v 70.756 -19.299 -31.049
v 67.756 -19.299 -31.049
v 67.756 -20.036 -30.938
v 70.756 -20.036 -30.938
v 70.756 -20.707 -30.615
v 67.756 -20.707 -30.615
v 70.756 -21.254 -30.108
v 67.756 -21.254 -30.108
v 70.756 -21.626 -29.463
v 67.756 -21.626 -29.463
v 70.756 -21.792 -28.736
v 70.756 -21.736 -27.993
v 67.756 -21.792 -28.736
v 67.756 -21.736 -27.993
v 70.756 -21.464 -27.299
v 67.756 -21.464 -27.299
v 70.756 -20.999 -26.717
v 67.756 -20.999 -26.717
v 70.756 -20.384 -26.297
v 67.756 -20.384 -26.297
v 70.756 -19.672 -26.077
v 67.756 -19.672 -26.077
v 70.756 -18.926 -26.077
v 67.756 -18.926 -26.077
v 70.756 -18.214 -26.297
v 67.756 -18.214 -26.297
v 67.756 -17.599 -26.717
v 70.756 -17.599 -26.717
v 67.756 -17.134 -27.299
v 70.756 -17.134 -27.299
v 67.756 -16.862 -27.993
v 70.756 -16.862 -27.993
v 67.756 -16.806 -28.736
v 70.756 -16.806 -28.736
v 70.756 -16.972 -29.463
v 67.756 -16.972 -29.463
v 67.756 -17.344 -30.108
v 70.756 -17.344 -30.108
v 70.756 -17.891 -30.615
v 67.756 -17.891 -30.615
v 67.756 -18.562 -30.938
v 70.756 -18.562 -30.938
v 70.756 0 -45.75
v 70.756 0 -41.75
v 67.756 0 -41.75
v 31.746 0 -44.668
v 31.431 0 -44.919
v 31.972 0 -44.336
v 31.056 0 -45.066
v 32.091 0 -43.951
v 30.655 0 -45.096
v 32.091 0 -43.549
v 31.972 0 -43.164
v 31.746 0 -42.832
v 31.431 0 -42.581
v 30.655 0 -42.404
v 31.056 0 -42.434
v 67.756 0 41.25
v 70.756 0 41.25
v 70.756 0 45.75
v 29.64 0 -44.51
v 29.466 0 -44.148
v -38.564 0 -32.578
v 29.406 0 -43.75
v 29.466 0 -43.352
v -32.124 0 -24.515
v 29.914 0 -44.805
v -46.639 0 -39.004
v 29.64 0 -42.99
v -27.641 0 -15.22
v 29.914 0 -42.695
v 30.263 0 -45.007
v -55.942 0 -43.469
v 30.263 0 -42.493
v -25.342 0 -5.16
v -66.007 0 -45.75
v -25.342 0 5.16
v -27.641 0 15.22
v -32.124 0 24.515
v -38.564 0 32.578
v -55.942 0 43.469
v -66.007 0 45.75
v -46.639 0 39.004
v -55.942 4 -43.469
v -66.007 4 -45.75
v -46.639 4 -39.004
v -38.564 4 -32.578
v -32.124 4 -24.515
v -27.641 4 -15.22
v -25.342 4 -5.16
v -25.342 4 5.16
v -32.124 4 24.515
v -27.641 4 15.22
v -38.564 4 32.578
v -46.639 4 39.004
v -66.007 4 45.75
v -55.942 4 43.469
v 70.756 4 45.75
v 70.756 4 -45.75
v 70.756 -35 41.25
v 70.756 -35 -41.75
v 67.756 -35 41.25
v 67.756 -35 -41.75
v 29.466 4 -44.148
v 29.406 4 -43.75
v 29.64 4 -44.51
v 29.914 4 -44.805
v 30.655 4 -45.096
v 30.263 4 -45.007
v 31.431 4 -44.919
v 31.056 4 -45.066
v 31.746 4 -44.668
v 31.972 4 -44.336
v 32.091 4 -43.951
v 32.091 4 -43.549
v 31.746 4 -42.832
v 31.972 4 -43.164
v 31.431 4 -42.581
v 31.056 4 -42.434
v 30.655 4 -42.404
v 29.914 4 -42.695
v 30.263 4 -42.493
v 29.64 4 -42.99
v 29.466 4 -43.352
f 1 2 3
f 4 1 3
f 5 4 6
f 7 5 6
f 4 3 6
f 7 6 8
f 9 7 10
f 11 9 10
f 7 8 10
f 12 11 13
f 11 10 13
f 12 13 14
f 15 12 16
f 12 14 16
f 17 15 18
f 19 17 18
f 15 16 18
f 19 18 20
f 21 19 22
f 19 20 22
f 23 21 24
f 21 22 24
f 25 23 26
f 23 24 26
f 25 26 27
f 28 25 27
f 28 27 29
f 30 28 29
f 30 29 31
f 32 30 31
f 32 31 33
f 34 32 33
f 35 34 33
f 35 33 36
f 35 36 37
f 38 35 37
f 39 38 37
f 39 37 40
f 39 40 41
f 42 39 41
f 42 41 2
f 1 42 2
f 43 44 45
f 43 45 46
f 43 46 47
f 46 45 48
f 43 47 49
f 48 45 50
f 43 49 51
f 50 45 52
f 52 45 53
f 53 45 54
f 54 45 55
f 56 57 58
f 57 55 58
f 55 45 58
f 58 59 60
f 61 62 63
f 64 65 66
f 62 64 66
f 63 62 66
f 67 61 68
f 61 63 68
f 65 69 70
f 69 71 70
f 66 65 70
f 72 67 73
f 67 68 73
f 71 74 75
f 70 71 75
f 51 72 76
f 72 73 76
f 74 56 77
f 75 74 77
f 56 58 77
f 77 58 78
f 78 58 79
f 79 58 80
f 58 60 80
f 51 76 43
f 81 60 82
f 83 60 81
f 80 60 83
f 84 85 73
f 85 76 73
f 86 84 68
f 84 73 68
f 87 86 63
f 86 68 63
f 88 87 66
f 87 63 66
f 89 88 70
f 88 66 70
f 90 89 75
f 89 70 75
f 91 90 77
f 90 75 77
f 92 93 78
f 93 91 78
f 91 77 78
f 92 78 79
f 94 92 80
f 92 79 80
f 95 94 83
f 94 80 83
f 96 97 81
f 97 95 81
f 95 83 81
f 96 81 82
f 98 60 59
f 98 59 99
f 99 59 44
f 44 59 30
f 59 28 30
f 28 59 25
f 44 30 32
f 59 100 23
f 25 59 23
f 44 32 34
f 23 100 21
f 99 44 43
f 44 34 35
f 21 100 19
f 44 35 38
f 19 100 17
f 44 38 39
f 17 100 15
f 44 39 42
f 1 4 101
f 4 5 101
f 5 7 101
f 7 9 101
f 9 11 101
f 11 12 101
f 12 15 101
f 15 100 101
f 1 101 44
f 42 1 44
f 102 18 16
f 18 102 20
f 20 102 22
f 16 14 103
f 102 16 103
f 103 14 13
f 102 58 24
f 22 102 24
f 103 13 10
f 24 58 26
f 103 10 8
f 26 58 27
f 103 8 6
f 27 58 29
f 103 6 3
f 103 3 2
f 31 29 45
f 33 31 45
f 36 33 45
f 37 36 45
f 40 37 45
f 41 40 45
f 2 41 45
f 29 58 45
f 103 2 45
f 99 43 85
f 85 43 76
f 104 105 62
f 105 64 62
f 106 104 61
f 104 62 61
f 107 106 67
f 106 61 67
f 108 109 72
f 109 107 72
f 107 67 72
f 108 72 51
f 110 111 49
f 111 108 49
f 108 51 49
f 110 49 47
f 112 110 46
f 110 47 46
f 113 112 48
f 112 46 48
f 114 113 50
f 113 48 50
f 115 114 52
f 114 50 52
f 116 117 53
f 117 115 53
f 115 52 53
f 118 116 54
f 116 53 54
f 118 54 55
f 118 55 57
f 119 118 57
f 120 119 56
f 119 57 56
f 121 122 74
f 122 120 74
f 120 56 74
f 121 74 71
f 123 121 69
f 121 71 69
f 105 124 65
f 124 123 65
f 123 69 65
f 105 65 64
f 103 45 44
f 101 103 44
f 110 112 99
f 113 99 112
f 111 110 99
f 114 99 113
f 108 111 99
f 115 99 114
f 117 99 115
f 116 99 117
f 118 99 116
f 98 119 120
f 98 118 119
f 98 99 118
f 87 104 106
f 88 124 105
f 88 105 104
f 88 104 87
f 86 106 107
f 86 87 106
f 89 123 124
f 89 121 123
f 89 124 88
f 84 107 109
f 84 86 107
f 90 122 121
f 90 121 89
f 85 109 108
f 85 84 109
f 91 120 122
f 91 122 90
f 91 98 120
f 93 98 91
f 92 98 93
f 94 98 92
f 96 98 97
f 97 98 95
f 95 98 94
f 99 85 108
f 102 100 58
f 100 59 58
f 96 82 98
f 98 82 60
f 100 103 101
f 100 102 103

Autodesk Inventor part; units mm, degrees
ref_plane "YZ Plane" through (0, 0, 0) normal (1, 0, 0) x (0, 1, 0)
ref_plane "XZ Plane" through (0, 0, 0) normal (0, 1, 0) x (-1, 0, 0)
ref_plane "XY Plane" through (0, 0, 0) normal (0, 0, 1) x (1, 0, 0)
sketch "Esboço1" plane through (0, 0, 0) normal (0, 1, 0) x (-1, 0, 0)
  line L0 (-70.7559, -45.75) -> (70.7559, -45.75)
  line L1 (70.7559, 45.75) -> (-70.7559, 45.75)
  line L2 (-70.7559, 45.75) -> (-70.7559, -45.75)
  line L3 (-70.7559, -45.75) -> (70.7559, 45.75) construction
  line L4 (70.7559, -45.75) -> (-70.7559, 45.75) construction
  arc A0 (66.0067, 45.75) -> (66.0067, -45.75) centre (71.083, 0) ccw
  circle A1 centre (-30.7559, -43.75) radius 1.35
  point P0 (0, 0)
  dimension "d3" = 2.7
  dimension "d4" = 2
  dimension "d5" = 40
  dimension "d15" = 91.5
extrude "Extrusão1" add sketch "Esboço1" along normal blind 4
sketch "Esboço2" plane through (0, 0, 0) normal (0, -1, 0) x (1, 0, 0)
  line L0 (-66.0067, 45.75) -> (70.7559, 45.75) projected
  line L1 (70.7559, -45.75) -> (-66.0067, -45.75) projected
  line L2 (70.7559, 45.75) -> (67.7559, 45.75)
  line L3 (67.7559, 45.75) -> (67.7559, -45.75)
  line L4 (67.7559, -45.75) -> (70.7559, -45.75)
  line L5 (70.7559, -45.75) -> (70.7559, 45.75)
  line L6 (67.7559, -41.75) -> (70.7559, -41.75)
  line L7 (70.7559, -41.75) -> (70.7559, 41.25)
  line L8 (70.7559, 41.25) -> (67.7559, 41.25)
  line L9 (67.7559, 41.25) -> (67.7559, -41.75)
  line L10 (67.7559, -41.75) -> (70.7559, 41.25) construction
  line L11 (70.7559, -41.75) -> (67.7559, 41.25) construction
  point P0 (0, 0)
  point P1 (69.2559, -0.25)
  point P2 (70.7559, 41.25)
  point P3 (67.7559, 41.25)
  point P4 (67.7559, -41.75)
  point P5 (70.7559, -41.75)
  point P6 (69.2559, -41.75)
  point P7 (69.2559, -45.75)
  point P8 (69.2559, 45.75)
  point P9 (69.2559, 41.25)
  dimension "d8" = 3
  dimension "d9" = 3
  dimension "d10" = 83
  dimension "d14" = 4.5
extrude "Extrusão2" add sketch "Esboço2" along normal blind 35 contours L8 L5 L6 L3
sketch "Esboço3" plane through (70.7559, 0, -45.75) normal (1, 0, 0) x (0, 0, -1)
  circle A0 centre (-17.2006, -19.299) radius 2.5
  point P0 (-45.75, 0)
  dimension "d16" = 5
hole "Furo1" at (70.7559, -19.299, -28.5494) direction (-1, 0, 0) diameter 5 end through all
properties part number "TAMPA_BASE"
